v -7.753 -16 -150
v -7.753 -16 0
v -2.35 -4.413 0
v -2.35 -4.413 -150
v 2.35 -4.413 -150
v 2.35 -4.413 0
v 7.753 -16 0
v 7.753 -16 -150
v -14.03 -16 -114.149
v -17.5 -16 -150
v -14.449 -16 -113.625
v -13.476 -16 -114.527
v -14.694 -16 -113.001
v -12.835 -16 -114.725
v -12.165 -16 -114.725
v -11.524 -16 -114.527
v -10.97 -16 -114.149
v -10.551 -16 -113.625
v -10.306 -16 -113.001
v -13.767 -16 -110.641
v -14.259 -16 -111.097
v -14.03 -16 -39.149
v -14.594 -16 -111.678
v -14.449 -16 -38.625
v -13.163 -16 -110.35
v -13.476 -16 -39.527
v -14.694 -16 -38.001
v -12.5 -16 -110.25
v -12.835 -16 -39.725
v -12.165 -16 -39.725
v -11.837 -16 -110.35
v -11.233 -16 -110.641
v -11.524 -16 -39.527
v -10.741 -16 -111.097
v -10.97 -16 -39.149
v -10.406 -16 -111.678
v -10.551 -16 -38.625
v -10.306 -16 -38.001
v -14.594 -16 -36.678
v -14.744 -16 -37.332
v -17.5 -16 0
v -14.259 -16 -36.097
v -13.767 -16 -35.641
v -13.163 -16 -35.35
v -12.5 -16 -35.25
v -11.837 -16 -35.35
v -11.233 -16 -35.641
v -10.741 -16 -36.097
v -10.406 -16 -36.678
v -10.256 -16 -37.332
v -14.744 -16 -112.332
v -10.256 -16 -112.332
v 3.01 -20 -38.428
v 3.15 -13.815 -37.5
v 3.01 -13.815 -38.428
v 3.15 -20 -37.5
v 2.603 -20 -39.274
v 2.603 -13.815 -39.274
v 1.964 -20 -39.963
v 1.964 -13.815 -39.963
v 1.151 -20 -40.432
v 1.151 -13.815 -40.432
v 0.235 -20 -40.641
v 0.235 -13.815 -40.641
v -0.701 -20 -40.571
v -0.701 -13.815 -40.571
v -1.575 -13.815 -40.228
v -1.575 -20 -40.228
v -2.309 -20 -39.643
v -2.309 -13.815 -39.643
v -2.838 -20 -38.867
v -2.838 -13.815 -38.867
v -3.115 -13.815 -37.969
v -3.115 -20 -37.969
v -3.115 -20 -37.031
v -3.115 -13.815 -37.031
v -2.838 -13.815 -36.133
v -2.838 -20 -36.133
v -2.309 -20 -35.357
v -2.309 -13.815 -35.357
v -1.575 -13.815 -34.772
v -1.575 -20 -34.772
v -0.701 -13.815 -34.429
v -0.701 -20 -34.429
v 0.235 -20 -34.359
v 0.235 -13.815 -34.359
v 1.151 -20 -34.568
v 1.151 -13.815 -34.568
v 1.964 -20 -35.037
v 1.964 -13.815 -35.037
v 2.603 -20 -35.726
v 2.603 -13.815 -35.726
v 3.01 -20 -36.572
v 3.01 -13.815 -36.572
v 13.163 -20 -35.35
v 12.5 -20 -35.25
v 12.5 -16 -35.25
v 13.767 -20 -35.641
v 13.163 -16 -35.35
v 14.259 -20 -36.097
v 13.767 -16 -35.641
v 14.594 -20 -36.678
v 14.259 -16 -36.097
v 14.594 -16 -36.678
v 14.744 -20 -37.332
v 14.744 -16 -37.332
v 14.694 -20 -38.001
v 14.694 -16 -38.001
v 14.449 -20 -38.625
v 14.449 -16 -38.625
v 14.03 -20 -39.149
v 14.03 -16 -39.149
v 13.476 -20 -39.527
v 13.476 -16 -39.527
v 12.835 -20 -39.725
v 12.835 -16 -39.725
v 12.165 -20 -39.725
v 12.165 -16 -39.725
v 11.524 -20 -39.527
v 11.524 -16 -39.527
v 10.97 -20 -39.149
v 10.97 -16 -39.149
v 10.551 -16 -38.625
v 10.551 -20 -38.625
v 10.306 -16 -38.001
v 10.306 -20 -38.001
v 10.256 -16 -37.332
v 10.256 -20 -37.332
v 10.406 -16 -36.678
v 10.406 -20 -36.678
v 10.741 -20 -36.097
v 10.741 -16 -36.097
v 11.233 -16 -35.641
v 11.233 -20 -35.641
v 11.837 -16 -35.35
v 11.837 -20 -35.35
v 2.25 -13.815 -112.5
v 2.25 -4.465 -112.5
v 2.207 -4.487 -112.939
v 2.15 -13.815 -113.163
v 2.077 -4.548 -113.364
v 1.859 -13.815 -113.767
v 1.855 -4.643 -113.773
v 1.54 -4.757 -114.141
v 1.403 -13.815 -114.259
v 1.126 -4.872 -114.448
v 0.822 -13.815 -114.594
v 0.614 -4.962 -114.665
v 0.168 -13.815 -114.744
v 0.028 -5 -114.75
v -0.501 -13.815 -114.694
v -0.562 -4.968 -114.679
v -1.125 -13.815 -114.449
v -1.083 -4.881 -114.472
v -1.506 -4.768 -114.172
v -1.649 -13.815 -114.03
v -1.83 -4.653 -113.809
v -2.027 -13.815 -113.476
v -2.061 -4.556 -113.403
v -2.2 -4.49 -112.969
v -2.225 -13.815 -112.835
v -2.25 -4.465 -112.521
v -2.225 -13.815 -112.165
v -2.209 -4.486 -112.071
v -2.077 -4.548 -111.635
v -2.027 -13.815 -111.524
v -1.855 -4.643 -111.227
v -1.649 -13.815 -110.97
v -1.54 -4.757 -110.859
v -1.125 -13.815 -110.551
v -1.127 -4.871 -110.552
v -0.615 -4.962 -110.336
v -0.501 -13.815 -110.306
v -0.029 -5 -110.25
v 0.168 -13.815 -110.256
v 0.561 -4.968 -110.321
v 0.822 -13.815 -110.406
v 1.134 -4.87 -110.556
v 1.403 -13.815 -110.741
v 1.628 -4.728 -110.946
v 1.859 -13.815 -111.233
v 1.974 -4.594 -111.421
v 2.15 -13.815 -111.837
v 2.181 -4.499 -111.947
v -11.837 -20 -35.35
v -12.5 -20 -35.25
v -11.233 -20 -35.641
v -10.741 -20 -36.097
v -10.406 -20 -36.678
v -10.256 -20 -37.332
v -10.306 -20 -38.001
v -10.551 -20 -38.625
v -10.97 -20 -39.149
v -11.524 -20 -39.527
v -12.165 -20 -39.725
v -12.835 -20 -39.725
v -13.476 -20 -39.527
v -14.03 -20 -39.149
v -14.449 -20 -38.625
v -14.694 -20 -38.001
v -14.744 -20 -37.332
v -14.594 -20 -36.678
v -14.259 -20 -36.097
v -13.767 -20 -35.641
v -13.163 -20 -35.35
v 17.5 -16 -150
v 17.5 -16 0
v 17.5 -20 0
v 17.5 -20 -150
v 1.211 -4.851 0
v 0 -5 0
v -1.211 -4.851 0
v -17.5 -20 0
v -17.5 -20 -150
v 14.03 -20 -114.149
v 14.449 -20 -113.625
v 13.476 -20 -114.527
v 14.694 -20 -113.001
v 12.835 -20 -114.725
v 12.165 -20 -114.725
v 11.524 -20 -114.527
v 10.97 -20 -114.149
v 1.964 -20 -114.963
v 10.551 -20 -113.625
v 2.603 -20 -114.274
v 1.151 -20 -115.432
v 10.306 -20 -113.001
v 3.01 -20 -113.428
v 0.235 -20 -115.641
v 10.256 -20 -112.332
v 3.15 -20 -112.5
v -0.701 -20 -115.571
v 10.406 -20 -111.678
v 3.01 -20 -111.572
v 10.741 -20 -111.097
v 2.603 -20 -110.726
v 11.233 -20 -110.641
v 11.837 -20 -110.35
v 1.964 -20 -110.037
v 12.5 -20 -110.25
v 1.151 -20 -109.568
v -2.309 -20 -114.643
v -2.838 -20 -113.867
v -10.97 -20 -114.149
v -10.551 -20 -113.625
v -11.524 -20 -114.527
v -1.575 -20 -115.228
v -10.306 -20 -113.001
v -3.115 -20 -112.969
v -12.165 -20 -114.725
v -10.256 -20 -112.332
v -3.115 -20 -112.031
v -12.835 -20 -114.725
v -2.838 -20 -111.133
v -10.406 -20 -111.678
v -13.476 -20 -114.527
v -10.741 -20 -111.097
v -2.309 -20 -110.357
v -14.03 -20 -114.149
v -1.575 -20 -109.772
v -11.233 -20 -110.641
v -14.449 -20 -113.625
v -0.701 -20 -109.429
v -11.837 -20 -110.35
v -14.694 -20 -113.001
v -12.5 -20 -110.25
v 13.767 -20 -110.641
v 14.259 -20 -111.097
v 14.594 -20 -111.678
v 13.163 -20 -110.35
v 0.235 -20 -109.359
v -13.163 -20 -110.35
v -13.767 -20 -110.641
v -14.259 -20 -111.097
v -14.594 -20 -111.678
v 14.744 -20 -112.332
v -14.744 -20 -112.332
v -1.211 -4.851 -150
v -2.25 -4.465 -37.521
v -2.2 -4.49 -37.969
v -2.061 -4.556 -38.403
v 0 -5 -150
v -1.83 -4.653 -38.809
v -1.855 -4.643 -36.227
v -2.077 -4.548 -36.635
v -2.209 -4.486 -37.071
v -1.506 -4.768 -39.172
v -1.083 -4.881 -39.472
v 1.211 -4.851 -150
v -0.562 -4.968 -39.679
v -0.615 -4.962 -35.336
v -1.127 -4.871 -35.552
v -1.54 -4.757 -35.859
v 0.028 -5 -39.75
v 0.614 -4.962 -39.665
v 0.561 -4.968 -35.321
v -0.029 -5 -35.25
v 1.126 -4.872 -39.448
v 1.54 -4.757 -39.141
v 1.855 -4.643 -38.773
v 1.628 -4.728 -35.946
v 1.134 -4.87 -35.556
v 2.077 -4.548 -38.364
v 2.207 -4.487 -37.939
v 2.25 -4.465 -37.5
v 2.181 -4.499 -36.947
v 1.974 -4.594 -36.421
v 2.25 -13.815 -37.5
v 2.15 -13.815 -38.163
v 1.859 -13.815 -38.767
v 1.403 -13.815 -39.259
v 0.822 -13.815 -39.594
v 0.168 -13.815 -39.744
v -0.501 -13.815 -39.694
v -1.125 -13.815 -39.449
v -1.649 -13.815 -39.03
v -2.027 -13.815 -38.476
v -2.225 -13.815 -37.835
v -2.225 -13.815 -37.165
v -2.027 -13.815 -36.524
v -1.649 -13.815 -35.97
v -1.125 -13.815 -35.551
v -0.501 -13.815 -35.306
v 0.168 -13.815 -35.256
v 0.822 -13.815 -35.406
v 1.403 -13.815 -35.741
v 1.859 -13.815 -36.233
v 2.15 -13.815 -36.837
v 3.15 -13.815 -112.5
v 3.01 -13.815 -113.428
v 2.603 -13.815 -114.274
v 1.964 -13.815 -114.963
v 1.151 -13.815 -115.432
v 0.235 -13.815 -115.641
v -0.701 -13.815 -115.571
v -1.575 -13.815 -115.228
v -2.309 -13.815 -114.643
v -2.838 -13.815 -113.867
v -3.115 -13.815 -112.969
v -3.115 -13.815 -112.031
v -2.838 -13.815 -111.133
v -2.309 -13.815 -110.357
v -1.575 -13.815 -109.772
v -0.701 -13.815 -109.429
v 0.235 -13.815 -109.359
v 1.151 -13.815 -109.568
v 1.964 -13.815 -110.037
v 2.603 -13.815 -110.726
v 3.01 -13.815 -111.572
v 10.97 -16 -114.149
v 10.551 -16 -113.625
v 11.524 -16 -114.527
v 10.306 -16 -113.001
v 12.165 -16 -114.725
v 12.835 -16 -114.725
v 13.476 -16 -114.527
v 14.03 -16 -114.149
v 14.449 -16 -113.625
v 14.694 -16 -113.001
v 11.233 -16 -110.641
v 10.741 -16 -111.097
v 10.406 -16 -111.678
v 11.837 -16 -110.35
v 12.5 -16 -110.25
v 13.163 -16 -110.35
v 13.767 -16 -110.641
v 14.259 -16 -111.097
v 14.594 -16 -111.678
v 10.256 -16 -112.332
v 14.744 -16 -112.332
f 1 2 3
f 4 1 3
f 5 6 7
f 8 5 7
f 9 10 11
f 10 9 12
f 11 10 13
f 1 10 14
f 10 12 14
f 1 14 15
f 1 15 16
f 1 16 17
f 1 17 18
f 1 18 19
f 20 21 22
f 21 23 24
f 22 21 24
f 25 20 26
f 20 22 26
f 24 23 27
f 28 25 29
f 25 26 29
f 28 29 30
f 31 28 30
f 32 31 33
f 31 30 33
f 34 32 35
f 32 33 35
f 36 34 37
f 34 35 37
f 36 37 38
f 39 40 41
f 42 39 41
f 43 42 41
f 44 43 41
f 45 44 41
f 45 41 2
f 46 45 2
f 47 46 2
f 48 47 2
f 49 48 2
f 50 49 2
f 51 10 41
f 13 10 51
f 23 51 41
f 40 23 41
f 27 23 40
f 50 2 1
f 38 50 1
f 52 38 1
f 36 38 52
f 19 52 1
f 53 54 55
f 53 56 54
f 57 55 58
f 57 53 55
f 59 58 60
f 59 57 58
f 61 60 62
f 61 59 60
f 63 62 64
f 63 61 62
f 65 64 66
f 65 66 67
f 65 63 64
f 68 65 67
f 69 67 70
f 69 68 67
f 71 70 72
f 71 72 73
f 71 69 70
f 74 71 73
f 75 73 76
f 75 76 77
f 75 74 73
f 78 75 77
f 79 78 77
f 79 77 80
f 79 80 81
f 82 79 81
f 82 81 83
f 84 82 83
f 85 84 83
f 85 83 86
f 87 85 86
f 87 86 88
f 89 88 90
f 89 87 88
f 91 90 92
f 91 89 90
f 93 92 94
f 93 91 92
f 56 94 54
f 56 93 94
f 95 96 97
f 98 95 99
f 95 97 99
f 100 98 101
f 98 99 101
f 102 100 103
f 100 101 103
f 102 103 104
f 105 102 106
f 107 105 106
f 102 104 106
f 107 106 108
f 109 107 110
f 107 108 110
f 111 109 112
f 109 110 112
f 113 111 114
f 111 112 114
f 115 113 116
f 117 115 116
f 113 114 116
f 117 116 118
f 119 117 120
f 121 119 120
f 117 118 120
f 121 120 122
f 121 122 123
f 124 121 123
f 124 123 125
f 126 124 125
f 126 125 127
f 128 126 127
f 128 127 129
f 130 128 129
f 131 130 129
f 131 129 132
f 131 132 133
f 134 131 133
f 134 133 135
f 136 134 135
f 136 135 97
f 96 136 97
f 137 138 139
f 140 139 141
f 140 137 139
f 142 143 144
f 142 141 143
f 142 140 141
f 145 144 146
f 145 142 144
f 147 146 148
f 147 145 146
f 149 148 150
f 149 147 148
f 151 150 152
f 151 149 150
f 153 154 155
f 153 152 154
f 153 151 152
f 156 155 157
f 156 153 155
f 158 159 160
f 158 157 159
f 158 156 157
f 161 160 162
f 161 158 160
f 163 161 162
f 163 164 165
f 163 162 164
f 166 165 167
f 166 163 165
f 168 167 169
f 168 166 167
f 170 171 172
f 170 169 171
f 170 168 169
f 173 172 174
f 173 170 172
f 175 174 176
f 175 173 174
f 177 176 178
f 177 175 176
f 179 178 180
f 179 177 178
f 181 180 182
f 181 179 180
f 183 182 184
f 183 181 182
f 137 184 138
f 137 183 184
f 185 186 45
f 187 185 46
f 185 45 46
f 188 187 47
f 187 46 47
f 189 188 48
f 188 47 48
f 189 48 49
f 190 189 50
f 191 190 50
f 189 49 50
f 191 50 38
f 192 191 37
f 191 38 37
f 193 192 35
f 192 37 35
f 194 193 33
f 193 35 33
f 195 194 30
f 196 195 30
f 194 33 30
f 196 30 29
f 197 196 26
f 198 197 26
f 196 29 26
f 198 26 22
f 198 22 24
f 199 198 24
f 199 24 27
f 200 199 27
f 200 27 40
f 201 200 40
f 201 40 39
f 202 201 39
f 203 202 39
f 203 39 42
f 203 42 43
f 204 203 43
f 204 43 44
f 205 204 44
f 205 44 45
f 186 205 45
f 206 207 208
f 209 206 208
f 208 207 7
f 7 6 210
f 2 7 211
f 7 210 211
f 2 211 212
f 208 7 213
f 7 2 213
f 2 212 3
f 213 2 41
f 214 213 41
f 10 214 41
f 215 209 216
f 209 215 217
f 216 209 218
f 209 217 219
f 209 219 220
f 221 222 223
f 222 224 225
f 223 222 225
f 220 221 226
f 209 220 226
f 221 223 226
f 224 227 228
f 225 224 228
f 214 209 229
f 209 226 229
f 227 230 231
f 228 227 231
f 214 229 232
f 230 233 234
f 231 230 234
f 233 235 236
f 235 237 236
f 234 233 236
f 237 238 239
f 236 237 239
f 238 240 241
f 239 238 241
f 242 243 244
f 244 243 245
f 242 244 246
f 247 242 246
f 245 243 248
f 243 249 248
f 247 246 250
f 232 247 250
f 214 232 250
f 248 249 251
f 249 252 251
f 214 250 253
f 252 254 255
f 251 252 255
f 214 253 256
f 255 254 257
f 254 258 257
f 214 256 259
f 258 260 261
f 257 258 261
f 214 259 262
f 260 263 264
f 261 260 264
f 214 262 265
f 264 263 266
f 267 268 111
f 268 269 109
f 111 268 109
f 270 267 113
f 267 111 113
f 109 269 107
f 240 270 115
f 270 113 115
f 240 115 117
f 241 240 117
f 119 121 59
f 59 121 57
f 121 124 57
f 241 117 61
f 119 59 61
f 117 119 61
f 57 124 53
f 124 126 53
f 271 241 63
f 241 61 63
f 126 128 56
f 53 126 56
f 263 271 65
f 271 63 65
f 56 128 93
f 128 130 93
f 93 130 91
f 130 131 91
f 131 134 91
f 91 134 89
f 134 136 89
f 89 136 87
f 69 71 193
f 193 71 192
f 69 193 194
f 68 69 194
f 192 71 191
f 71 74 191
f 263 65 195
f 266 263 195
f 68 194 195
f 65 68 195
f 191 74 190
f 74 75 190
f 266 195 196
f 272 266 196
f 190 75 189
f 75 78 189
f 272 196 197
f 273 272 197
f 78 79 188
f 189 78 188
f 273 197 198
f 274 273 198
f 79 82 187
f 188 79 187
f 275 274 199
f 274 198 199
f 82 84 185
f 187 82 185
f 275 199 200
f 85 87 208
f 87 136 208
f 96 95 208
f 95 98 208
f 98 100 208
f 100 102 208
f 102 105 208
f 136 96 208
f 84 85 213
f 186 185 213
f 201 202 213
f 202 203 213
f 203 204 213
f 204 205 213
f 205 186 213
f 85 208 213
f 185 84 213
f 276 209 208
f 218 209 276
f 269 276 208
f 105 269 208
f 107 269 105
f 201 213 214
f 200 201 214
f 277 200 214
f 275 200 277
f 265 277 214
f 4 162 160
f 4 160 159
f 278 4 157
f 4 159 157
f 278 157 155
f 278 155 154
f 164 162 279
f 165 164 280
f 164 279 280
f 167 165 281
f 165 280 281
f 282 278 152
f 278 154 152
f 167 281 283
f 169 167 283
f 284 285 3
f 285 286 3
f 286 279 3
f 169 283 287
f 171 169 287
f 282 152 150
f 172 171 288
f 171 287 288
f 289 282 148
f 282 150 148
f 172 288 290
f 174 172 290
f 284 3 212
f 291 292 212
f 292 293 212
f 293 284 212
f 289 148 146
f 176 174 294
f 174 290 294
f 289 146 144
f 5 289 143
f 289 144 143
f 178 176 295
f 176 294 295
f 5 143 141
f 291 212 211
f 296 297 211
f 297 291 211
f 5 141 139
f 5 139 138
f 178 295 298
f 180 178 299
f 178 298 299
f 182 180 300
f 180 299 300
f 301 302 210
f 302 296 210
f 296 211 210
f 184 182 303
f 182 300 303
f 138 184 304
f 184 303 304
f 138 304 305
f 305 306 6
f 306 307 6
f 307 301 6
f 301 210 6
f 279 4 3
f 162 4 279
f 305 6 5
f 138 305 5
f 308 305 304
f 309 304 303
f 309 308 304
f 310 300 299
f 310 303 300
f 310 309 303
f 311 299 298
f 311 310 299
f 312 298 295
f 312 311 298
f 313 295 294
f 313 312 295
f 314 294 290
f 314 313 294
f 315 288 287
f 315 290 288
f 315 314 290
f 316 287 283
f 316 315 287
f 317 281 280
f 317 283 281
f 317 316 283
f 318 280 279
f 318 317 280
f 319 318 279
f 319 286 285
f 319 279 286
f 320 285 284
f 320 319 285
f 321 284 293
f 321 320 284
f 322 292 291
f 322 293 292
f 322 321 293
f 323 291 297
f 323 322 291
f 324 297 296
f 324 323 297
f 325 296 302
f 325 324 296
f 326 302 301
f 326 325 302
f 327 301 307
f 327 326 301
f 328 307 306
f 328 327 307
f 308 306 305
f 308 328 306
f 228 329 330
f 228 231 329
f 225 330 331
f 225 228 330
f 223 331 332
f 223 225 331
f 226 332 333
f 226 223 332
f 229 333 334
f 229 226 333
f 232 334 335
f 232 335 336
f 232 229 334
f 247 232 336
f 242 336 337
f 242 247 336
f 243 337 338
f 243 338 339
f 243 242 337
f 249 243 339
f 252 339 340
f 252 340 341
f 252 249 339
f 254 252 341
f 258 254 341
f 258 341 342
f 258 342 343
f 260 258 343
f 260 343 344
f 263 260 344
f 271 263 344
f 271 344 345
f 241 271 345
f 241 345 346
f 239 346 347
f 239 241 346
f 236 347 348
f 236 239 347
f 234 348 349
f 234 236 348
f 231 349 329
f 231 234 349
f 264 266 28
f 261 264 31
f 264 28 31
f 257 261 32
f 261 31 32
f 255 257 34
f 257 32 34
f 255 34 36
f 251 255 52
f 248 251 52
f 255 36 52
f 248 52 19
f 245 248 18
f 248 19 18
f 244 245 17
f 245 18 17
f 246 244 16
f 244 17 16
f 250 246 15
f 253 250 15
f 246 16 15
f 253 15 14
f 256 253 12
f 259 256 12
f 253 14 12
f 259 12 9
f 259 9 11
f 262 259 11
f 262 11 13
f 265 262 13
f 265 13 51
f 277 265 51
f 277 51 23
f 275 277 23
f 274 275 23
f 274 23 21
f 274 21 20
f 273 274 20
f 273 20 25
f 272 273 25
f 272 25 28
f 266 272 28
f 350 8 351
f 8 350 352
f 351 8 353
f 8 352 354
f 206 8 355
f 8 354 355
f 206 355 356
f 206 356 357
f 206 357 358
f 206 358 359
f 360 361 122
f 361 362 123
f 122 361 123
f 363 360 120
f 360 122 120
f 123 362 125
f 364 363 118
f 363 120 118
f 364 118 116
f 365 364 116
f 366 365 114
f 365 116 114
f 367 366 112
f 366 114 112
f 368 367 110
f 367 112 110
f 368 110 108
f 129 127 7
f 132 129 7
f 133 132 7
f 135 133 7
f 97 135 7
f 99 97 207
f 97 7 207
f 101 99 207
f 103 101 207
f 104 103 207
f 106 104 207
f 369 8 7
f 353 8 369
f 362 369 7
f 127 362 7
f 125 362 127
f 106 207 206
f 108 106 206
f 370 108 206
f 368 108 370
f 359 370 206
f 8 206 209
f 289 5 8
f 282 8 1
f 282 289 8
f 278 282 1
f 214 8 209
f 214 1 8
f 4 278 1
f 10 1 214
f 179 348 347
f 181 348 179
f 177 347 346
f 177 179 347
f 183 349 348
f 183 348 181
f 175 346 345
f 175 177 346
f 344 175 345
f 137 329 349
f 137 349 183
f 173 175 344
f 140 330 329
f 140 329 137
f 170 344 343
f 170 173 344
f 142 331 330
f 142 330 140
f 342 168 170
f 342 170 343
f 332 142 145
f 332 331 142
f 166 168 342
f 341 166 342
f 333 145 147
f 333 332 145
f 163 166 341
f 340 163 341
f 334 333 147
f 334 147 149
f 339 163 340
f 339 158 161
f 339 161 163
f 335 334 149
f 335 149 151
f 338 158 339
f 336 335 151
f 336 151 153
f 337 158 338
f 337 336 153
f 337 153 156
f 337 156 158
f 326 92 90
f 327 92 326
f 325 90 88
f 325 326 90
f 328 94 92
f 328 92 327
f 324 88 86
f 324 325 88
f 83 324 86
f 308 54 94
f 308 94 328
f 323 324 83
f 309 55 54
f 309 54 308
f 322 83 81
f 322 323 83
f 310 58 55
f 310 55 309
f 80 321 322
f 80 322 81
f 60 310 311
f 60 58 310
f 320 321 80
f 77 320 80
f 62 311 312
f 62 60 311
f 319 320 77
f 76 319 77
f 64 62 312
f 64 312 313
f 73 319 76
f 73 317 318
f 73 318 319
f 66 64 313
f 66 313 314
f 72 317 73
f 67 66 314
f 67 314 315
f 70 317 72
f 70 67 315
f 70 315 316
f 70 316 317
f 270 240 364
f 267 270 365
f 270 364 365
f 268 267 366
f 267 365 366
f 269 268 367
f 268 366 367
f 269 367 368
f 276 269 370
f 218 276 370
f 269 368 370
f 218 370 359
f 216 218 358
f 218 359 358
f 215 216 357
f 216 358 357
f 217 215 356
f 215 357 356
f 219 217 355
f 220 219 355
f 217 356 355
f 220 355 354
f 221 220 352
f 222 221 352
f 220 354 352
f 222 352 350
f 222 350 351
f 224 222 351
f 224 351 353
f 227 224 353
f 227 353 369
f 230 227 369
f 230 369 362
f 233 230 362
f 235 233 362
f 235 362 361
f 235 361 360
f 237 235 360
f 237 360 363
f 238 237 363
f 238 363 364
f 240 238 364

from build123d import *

# Parameters (mm, degrees)
EXTRUDE_1_DEPTH        = 150
SKETCH_3_R             = 2.25
CUT_EXTRUDE_1_DEPTH    = 20
PATTERN_LINEAR_1_COUNT = 2
PATTERN_LINEAR_1_PITCH = 75


with BuildPart() as part:
    # 草图2 → 凸台-拉伸1 (new body)
    with BuildSketch(Plane.XY):
        with BuildLine():
            Line((2.35, -4.413332075), (7.752951986, -16))
            Line((7.752951986, -16), (17.5, -16))
            Line((17.5, -16), (17.5, -20))
            Line((17.5, -20), (-17.5, -20))
            Line((-17.5, -20), (-17.5, -16))
            Line((-17.5, -16), (-7.752951986, -16))
            Line((-7.752951986, -16), (-2.35, -4.413332075))
            ThreePointArc((-2.35, -4.413332075), (0, -5), (2.35, -4.413332075))
        make_face()
    extrude(amount=-EXTRUDE_1_DEPTH)

    # 草图3 → 切除-拉伸1 (cut)
    with BuildSketch(Plane(origin=(0, 0, 0), x_dir=(1, 0, 0), z_dir=(0, 1, 0))):
        with Locations(Location((12.5, 37.5, 0), (0, 0, 270))):
            Circle(SKETCH_3_R)
        with Locations(Location((-12.5, 37.5, 0), (0, 0, 270))):
            Circle(SKETCH_3_R)
    cut_extrude_1 = extrude(amount=-CUT_EXTRUDE_1_DEPTH, mode=Mode.SUBTRACT)

    # 草图4 → 切除-旋转1 (revolve, cut)
    with BuildSketch(Plane.XY.offset(-37.5), mode=Mode.PRIVATE) as cut_revolve_1_sk:
        Polygon((-2.25, -4.465142775), (-2.25, -13.815142775), (-3.15, -13.815142775), (-3.15, -20), (0, -20), (0, -4.465142775), align=None)
    cut_revolve_1 = revolve(cut_revolve_1_sk.sketch.rotate(Axis((0, -20, -37.5), (0, 1, 0)), 180), axis=Axis((0, -20, -37.5), (0, 1, 0)), mode=Mode.SUBTRACT)

    # 阵列(线性)1: 切除-拉伸1, 切除-旋转1 ×2
    with Locations(*[(0, 0, -i * PATTERN_LINEAR_1_PITCH) for i in range(1, PATTERN_LINEAR_1_COUNT)]):
        add(cut_extrude_1, mode=Mode.SUBTRACT)
        add(cut_revolve_1, mode=Mode.SUBTRACT)


solid = part.part
